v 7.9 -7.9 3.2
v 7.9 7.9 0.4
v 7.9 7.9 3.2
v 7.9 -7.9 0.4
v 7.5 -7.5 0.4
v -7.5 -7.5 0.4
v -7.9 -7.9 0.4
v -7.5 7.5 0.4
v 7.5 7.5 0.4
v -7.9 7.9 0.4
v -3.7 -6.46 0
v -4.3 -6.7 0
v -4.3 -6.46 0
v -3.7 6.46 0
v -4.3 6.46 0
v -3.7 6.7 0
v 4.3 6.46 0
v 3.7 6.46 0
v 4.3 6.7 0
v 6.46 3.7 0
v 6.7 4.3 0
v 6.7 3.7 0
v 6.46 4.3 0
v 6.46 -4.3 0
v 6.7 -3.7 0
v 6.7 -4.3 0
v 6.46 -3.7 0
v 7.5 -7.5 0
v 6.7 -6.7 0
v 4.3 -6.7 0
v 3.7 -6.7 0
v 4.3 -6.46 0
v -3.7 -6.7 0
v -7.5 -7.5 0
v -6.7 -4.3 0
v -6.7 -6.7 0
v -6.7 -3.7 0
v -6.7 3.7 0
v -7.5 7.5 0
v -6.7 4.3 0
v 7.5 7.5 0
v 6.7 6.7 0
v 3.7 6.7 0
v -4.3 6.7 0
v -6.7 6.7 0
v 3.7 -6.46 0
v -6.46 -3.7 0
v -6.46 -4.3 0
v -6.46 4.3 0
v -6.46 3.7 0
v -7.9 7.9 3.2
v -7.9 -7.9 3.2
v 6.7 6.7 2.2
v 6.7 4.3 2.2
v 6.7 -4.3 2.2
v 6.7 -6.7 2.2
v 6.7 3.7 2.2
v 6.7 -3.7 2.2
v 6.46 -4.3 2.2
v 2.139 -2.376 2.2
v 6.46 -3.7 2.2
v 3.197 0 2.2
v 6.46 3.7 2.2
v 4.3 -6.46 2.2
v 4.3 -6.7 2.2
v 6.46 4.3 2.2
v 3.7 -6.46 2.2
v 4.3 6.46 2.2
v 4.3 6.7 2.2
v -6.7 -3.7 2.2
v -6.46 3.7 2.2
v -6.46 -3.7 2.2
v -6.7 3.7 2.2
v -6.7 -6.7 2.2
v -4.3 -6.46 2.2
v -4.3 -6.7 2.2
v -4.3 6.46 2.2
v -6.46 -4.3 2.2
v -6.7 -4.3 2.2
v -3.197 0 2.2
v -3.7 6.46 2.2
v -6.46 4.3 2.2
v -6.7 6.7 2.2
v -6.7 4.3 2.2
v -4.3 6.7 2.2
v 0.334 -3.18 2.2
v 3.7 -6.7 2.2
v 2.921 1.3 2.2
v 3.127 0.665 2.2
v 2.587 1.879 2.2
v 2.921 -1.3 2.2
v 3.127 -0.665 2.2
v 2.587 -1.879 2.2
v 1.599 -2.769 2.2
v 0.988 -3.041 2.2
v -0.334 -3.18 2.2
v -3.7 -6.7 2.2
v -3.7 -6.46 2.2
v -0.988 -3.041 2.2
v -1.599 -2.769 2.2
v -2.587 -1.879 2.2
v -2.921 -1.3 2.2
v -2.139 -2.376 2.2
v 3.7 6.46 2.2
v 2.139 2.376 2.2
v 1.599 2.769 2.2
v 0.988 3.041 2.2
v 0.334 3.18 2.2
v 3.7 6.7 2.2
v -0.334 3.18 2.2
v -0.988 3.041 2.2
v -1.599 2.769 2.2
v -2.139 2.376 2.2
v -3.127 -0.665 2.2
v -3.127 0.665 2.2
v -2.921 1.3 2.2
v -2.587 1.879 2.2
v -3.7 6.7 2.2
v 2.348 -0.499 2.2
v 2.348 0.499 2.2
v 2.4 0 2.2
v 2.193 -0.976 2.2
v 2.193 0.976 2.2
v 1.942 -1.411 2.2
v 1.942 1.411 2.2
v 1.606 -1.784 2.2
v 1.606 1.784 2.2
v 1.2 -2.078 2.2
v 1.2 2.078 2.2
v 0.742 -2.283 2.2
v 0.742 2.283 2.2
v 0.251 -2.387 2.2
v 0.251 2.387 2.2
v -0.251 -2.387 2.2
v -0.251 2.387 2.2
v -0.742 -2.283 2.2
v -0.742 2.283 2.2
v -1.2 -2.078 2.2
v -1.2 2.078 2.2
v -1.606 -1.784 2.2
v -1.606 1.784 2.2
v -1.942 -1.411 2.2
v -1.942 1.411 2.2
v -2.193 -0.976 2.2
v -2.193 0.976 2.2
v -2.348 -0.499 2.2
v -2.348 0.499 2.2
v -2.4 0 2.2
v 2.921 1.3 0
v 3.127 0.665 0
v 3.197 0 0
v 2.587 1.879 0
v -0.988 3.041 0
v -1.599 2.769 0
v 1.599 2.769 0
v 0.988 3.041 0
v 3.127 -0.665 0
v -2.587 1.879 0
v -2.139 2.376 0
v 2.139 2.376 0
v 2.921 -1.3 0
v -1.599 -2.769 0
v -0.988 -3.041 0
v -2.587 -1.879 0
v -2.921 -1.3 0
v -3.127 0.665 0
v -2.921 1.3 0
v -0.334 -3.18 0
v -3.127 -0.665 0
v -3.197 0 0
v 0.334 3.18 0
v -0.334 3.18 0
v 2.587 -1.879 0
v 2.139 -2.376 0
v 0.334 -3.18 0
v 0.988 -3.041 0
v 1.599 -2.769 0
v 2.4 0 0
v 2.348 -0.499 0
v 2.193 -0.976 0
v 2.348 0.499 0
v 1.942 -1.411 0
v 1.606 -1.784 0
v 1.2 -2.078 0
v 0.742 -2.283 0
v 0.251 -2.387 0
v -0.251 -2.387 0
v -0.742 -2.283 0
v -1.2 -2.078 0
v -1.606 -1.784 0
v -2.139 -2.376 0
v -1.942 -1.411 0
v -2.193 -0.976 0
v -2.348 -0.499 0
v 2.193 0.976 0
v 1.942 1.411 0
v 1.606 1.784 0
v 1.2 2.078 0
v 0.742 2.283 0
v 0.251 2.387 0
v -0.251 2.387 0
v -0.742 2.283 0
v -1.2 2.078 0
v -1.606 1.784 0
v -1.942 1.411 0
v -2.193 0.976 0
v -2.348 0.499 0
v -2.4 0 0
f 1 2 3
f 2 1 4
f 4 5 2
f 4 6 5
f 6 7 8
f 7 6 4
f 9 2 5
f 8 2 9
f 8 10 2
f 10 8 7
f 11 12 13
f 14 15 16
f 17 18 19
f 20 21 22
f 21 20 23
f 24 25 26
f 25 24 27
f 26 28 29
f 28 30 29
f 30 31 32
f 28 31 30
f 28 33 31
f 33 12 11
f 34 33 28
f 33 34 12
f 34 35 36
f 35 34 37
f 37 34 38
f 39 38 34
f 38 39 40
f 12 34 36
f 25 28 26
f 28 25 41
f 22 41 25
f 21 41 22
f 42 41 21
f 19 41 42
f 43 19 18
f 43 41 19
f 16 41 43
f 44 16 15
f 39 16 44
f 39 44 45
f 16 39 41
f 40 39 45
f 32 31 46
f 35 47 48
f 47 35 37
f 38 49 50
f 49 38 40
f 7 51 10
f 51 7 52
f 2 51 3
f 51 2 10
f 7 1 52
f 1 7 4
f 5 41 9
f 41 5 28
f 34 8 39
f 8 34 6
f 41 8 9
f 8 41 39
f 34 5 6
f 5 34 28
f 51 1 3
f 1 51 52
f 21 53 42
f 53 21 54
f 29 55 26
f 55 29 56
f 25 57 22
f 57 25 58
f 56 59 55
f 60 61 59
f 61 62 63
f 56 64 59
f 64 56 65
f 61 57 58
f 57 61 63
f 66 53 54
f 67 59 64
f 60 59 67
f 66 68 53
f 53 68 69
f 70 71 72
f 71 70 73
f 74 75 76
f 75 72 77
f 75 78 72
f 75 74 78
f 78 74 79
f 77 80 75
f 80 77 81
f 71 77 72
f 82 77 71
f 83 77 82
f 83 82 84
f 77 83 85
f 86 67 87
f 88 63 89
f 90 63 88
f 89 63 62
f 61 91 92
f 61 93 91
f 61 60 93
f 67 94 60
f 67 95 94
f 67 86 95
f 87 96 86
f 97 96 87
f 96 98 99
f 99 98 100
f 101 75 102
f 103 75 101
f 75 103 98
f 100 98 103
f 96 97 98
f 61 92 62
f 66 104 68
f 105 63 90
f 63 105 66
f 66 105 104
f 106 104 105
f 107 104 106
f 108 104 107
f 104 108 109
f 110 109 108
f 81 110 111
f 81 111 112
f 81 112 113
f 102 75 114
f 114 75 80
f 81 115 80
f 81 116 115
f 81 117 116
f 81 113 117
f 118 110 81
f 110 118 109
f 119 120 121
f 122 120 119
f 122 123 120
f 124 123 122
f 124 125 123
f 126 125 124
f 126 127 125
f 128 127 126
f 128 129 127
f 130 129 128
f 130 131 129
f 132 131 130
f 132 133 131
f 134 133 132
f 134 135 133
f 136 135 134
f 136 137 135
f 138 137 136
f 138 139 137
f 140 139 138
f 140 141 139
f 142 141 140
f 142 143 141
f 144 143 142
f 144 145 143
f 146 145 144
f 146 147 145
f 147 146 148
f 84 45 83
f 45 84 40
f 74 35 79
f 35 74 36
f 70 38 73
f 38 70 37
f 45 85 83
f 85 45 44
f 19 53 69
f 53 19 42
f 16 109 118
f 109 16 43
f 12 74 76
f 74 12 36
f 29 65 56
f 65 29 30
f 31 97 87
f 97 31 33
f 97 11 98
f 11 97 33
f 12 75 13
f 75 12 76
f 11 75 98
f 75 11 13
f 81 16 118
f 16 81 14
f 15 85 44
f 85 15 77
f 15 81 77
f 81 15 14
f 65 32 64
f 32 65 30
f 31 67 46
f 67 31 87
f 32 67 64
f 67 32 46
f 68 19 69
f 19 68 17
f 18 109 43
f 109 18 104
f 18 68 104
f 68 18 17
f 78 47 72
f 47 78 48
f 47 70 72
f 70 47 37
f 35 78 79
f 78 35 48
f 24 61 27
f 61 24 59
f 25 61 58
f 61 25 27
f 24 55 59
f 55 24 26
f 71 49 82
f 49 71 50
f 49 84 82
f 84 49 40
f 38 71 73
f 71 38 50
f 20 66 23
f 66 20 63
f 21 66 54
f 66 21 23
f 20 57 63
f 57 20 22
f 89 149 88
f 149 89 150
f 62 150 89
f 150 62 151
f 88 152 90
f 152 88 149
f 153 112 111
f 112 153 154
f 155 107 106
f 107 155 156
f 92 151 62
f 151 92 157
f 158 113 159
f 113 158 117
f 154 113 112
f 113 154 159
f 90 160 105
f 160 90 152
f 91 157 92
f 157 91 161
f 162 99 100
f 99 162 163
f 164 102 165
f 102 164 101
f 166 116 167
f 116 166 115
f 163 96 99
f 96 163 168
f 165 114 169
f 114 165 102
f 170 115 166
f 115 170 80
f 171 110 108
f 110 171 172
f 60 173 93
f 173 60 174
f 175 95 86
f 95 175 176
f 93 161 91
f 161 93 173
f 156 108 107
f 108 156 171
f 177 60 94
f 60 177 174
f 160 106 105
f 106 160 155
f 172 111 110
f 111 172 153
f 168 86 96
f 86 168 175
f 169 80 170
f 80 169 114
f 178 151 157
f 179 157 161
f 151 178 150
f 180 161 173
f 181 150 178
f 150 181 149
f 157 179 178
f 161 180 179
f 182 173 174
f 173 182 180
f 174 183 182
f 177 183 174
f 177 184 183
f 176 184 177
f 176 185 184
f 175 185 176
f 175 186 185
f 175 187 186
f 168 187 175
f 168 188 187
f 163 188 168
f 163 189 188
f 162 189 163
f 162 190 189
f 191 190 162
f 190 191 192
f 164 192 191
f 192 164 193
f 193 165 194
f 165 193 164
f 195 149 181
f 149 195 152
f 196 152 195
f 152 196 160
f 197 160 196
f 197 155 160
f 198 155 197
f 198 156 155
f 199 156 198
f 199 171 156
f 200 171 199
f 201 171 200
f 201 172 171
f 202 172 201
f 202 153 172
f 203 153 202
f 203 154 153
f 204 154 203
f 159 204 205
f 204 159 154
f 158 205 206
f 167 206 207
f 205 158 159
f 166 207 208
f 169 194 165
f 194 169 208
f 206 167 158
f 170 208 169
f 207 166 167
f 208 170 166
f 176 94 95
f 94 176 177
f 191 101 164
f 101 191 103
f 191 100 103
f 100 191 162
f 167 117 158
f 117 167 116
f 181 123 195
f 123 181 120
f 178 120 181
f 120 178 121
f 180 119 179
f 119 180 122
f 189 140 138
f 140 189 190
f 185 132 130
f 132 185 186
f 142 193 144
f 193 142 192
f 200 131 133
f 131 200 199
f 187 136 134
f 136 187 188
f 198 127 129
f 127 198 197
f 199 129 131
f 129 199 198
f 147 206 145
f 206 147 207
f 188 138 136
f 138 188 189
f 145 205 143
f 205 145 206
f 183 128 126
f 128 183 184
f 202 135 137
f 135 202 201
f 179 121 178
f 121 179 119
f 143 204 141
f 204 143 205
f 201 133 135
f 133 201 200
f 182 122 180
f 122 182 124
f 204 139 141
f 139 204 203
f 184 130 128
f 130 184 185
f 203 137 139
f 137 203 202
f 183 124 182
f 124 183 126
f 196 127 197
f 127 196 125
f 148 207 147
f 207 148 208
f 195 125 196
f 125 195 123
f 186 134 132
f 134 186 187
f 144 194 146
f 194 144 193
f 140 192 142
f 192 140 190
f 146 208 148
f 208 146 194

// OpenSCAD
use <../LEGO.scad>;

block(
    width=2,
    length=2,
    height=1/3,
    type="tile"
);
